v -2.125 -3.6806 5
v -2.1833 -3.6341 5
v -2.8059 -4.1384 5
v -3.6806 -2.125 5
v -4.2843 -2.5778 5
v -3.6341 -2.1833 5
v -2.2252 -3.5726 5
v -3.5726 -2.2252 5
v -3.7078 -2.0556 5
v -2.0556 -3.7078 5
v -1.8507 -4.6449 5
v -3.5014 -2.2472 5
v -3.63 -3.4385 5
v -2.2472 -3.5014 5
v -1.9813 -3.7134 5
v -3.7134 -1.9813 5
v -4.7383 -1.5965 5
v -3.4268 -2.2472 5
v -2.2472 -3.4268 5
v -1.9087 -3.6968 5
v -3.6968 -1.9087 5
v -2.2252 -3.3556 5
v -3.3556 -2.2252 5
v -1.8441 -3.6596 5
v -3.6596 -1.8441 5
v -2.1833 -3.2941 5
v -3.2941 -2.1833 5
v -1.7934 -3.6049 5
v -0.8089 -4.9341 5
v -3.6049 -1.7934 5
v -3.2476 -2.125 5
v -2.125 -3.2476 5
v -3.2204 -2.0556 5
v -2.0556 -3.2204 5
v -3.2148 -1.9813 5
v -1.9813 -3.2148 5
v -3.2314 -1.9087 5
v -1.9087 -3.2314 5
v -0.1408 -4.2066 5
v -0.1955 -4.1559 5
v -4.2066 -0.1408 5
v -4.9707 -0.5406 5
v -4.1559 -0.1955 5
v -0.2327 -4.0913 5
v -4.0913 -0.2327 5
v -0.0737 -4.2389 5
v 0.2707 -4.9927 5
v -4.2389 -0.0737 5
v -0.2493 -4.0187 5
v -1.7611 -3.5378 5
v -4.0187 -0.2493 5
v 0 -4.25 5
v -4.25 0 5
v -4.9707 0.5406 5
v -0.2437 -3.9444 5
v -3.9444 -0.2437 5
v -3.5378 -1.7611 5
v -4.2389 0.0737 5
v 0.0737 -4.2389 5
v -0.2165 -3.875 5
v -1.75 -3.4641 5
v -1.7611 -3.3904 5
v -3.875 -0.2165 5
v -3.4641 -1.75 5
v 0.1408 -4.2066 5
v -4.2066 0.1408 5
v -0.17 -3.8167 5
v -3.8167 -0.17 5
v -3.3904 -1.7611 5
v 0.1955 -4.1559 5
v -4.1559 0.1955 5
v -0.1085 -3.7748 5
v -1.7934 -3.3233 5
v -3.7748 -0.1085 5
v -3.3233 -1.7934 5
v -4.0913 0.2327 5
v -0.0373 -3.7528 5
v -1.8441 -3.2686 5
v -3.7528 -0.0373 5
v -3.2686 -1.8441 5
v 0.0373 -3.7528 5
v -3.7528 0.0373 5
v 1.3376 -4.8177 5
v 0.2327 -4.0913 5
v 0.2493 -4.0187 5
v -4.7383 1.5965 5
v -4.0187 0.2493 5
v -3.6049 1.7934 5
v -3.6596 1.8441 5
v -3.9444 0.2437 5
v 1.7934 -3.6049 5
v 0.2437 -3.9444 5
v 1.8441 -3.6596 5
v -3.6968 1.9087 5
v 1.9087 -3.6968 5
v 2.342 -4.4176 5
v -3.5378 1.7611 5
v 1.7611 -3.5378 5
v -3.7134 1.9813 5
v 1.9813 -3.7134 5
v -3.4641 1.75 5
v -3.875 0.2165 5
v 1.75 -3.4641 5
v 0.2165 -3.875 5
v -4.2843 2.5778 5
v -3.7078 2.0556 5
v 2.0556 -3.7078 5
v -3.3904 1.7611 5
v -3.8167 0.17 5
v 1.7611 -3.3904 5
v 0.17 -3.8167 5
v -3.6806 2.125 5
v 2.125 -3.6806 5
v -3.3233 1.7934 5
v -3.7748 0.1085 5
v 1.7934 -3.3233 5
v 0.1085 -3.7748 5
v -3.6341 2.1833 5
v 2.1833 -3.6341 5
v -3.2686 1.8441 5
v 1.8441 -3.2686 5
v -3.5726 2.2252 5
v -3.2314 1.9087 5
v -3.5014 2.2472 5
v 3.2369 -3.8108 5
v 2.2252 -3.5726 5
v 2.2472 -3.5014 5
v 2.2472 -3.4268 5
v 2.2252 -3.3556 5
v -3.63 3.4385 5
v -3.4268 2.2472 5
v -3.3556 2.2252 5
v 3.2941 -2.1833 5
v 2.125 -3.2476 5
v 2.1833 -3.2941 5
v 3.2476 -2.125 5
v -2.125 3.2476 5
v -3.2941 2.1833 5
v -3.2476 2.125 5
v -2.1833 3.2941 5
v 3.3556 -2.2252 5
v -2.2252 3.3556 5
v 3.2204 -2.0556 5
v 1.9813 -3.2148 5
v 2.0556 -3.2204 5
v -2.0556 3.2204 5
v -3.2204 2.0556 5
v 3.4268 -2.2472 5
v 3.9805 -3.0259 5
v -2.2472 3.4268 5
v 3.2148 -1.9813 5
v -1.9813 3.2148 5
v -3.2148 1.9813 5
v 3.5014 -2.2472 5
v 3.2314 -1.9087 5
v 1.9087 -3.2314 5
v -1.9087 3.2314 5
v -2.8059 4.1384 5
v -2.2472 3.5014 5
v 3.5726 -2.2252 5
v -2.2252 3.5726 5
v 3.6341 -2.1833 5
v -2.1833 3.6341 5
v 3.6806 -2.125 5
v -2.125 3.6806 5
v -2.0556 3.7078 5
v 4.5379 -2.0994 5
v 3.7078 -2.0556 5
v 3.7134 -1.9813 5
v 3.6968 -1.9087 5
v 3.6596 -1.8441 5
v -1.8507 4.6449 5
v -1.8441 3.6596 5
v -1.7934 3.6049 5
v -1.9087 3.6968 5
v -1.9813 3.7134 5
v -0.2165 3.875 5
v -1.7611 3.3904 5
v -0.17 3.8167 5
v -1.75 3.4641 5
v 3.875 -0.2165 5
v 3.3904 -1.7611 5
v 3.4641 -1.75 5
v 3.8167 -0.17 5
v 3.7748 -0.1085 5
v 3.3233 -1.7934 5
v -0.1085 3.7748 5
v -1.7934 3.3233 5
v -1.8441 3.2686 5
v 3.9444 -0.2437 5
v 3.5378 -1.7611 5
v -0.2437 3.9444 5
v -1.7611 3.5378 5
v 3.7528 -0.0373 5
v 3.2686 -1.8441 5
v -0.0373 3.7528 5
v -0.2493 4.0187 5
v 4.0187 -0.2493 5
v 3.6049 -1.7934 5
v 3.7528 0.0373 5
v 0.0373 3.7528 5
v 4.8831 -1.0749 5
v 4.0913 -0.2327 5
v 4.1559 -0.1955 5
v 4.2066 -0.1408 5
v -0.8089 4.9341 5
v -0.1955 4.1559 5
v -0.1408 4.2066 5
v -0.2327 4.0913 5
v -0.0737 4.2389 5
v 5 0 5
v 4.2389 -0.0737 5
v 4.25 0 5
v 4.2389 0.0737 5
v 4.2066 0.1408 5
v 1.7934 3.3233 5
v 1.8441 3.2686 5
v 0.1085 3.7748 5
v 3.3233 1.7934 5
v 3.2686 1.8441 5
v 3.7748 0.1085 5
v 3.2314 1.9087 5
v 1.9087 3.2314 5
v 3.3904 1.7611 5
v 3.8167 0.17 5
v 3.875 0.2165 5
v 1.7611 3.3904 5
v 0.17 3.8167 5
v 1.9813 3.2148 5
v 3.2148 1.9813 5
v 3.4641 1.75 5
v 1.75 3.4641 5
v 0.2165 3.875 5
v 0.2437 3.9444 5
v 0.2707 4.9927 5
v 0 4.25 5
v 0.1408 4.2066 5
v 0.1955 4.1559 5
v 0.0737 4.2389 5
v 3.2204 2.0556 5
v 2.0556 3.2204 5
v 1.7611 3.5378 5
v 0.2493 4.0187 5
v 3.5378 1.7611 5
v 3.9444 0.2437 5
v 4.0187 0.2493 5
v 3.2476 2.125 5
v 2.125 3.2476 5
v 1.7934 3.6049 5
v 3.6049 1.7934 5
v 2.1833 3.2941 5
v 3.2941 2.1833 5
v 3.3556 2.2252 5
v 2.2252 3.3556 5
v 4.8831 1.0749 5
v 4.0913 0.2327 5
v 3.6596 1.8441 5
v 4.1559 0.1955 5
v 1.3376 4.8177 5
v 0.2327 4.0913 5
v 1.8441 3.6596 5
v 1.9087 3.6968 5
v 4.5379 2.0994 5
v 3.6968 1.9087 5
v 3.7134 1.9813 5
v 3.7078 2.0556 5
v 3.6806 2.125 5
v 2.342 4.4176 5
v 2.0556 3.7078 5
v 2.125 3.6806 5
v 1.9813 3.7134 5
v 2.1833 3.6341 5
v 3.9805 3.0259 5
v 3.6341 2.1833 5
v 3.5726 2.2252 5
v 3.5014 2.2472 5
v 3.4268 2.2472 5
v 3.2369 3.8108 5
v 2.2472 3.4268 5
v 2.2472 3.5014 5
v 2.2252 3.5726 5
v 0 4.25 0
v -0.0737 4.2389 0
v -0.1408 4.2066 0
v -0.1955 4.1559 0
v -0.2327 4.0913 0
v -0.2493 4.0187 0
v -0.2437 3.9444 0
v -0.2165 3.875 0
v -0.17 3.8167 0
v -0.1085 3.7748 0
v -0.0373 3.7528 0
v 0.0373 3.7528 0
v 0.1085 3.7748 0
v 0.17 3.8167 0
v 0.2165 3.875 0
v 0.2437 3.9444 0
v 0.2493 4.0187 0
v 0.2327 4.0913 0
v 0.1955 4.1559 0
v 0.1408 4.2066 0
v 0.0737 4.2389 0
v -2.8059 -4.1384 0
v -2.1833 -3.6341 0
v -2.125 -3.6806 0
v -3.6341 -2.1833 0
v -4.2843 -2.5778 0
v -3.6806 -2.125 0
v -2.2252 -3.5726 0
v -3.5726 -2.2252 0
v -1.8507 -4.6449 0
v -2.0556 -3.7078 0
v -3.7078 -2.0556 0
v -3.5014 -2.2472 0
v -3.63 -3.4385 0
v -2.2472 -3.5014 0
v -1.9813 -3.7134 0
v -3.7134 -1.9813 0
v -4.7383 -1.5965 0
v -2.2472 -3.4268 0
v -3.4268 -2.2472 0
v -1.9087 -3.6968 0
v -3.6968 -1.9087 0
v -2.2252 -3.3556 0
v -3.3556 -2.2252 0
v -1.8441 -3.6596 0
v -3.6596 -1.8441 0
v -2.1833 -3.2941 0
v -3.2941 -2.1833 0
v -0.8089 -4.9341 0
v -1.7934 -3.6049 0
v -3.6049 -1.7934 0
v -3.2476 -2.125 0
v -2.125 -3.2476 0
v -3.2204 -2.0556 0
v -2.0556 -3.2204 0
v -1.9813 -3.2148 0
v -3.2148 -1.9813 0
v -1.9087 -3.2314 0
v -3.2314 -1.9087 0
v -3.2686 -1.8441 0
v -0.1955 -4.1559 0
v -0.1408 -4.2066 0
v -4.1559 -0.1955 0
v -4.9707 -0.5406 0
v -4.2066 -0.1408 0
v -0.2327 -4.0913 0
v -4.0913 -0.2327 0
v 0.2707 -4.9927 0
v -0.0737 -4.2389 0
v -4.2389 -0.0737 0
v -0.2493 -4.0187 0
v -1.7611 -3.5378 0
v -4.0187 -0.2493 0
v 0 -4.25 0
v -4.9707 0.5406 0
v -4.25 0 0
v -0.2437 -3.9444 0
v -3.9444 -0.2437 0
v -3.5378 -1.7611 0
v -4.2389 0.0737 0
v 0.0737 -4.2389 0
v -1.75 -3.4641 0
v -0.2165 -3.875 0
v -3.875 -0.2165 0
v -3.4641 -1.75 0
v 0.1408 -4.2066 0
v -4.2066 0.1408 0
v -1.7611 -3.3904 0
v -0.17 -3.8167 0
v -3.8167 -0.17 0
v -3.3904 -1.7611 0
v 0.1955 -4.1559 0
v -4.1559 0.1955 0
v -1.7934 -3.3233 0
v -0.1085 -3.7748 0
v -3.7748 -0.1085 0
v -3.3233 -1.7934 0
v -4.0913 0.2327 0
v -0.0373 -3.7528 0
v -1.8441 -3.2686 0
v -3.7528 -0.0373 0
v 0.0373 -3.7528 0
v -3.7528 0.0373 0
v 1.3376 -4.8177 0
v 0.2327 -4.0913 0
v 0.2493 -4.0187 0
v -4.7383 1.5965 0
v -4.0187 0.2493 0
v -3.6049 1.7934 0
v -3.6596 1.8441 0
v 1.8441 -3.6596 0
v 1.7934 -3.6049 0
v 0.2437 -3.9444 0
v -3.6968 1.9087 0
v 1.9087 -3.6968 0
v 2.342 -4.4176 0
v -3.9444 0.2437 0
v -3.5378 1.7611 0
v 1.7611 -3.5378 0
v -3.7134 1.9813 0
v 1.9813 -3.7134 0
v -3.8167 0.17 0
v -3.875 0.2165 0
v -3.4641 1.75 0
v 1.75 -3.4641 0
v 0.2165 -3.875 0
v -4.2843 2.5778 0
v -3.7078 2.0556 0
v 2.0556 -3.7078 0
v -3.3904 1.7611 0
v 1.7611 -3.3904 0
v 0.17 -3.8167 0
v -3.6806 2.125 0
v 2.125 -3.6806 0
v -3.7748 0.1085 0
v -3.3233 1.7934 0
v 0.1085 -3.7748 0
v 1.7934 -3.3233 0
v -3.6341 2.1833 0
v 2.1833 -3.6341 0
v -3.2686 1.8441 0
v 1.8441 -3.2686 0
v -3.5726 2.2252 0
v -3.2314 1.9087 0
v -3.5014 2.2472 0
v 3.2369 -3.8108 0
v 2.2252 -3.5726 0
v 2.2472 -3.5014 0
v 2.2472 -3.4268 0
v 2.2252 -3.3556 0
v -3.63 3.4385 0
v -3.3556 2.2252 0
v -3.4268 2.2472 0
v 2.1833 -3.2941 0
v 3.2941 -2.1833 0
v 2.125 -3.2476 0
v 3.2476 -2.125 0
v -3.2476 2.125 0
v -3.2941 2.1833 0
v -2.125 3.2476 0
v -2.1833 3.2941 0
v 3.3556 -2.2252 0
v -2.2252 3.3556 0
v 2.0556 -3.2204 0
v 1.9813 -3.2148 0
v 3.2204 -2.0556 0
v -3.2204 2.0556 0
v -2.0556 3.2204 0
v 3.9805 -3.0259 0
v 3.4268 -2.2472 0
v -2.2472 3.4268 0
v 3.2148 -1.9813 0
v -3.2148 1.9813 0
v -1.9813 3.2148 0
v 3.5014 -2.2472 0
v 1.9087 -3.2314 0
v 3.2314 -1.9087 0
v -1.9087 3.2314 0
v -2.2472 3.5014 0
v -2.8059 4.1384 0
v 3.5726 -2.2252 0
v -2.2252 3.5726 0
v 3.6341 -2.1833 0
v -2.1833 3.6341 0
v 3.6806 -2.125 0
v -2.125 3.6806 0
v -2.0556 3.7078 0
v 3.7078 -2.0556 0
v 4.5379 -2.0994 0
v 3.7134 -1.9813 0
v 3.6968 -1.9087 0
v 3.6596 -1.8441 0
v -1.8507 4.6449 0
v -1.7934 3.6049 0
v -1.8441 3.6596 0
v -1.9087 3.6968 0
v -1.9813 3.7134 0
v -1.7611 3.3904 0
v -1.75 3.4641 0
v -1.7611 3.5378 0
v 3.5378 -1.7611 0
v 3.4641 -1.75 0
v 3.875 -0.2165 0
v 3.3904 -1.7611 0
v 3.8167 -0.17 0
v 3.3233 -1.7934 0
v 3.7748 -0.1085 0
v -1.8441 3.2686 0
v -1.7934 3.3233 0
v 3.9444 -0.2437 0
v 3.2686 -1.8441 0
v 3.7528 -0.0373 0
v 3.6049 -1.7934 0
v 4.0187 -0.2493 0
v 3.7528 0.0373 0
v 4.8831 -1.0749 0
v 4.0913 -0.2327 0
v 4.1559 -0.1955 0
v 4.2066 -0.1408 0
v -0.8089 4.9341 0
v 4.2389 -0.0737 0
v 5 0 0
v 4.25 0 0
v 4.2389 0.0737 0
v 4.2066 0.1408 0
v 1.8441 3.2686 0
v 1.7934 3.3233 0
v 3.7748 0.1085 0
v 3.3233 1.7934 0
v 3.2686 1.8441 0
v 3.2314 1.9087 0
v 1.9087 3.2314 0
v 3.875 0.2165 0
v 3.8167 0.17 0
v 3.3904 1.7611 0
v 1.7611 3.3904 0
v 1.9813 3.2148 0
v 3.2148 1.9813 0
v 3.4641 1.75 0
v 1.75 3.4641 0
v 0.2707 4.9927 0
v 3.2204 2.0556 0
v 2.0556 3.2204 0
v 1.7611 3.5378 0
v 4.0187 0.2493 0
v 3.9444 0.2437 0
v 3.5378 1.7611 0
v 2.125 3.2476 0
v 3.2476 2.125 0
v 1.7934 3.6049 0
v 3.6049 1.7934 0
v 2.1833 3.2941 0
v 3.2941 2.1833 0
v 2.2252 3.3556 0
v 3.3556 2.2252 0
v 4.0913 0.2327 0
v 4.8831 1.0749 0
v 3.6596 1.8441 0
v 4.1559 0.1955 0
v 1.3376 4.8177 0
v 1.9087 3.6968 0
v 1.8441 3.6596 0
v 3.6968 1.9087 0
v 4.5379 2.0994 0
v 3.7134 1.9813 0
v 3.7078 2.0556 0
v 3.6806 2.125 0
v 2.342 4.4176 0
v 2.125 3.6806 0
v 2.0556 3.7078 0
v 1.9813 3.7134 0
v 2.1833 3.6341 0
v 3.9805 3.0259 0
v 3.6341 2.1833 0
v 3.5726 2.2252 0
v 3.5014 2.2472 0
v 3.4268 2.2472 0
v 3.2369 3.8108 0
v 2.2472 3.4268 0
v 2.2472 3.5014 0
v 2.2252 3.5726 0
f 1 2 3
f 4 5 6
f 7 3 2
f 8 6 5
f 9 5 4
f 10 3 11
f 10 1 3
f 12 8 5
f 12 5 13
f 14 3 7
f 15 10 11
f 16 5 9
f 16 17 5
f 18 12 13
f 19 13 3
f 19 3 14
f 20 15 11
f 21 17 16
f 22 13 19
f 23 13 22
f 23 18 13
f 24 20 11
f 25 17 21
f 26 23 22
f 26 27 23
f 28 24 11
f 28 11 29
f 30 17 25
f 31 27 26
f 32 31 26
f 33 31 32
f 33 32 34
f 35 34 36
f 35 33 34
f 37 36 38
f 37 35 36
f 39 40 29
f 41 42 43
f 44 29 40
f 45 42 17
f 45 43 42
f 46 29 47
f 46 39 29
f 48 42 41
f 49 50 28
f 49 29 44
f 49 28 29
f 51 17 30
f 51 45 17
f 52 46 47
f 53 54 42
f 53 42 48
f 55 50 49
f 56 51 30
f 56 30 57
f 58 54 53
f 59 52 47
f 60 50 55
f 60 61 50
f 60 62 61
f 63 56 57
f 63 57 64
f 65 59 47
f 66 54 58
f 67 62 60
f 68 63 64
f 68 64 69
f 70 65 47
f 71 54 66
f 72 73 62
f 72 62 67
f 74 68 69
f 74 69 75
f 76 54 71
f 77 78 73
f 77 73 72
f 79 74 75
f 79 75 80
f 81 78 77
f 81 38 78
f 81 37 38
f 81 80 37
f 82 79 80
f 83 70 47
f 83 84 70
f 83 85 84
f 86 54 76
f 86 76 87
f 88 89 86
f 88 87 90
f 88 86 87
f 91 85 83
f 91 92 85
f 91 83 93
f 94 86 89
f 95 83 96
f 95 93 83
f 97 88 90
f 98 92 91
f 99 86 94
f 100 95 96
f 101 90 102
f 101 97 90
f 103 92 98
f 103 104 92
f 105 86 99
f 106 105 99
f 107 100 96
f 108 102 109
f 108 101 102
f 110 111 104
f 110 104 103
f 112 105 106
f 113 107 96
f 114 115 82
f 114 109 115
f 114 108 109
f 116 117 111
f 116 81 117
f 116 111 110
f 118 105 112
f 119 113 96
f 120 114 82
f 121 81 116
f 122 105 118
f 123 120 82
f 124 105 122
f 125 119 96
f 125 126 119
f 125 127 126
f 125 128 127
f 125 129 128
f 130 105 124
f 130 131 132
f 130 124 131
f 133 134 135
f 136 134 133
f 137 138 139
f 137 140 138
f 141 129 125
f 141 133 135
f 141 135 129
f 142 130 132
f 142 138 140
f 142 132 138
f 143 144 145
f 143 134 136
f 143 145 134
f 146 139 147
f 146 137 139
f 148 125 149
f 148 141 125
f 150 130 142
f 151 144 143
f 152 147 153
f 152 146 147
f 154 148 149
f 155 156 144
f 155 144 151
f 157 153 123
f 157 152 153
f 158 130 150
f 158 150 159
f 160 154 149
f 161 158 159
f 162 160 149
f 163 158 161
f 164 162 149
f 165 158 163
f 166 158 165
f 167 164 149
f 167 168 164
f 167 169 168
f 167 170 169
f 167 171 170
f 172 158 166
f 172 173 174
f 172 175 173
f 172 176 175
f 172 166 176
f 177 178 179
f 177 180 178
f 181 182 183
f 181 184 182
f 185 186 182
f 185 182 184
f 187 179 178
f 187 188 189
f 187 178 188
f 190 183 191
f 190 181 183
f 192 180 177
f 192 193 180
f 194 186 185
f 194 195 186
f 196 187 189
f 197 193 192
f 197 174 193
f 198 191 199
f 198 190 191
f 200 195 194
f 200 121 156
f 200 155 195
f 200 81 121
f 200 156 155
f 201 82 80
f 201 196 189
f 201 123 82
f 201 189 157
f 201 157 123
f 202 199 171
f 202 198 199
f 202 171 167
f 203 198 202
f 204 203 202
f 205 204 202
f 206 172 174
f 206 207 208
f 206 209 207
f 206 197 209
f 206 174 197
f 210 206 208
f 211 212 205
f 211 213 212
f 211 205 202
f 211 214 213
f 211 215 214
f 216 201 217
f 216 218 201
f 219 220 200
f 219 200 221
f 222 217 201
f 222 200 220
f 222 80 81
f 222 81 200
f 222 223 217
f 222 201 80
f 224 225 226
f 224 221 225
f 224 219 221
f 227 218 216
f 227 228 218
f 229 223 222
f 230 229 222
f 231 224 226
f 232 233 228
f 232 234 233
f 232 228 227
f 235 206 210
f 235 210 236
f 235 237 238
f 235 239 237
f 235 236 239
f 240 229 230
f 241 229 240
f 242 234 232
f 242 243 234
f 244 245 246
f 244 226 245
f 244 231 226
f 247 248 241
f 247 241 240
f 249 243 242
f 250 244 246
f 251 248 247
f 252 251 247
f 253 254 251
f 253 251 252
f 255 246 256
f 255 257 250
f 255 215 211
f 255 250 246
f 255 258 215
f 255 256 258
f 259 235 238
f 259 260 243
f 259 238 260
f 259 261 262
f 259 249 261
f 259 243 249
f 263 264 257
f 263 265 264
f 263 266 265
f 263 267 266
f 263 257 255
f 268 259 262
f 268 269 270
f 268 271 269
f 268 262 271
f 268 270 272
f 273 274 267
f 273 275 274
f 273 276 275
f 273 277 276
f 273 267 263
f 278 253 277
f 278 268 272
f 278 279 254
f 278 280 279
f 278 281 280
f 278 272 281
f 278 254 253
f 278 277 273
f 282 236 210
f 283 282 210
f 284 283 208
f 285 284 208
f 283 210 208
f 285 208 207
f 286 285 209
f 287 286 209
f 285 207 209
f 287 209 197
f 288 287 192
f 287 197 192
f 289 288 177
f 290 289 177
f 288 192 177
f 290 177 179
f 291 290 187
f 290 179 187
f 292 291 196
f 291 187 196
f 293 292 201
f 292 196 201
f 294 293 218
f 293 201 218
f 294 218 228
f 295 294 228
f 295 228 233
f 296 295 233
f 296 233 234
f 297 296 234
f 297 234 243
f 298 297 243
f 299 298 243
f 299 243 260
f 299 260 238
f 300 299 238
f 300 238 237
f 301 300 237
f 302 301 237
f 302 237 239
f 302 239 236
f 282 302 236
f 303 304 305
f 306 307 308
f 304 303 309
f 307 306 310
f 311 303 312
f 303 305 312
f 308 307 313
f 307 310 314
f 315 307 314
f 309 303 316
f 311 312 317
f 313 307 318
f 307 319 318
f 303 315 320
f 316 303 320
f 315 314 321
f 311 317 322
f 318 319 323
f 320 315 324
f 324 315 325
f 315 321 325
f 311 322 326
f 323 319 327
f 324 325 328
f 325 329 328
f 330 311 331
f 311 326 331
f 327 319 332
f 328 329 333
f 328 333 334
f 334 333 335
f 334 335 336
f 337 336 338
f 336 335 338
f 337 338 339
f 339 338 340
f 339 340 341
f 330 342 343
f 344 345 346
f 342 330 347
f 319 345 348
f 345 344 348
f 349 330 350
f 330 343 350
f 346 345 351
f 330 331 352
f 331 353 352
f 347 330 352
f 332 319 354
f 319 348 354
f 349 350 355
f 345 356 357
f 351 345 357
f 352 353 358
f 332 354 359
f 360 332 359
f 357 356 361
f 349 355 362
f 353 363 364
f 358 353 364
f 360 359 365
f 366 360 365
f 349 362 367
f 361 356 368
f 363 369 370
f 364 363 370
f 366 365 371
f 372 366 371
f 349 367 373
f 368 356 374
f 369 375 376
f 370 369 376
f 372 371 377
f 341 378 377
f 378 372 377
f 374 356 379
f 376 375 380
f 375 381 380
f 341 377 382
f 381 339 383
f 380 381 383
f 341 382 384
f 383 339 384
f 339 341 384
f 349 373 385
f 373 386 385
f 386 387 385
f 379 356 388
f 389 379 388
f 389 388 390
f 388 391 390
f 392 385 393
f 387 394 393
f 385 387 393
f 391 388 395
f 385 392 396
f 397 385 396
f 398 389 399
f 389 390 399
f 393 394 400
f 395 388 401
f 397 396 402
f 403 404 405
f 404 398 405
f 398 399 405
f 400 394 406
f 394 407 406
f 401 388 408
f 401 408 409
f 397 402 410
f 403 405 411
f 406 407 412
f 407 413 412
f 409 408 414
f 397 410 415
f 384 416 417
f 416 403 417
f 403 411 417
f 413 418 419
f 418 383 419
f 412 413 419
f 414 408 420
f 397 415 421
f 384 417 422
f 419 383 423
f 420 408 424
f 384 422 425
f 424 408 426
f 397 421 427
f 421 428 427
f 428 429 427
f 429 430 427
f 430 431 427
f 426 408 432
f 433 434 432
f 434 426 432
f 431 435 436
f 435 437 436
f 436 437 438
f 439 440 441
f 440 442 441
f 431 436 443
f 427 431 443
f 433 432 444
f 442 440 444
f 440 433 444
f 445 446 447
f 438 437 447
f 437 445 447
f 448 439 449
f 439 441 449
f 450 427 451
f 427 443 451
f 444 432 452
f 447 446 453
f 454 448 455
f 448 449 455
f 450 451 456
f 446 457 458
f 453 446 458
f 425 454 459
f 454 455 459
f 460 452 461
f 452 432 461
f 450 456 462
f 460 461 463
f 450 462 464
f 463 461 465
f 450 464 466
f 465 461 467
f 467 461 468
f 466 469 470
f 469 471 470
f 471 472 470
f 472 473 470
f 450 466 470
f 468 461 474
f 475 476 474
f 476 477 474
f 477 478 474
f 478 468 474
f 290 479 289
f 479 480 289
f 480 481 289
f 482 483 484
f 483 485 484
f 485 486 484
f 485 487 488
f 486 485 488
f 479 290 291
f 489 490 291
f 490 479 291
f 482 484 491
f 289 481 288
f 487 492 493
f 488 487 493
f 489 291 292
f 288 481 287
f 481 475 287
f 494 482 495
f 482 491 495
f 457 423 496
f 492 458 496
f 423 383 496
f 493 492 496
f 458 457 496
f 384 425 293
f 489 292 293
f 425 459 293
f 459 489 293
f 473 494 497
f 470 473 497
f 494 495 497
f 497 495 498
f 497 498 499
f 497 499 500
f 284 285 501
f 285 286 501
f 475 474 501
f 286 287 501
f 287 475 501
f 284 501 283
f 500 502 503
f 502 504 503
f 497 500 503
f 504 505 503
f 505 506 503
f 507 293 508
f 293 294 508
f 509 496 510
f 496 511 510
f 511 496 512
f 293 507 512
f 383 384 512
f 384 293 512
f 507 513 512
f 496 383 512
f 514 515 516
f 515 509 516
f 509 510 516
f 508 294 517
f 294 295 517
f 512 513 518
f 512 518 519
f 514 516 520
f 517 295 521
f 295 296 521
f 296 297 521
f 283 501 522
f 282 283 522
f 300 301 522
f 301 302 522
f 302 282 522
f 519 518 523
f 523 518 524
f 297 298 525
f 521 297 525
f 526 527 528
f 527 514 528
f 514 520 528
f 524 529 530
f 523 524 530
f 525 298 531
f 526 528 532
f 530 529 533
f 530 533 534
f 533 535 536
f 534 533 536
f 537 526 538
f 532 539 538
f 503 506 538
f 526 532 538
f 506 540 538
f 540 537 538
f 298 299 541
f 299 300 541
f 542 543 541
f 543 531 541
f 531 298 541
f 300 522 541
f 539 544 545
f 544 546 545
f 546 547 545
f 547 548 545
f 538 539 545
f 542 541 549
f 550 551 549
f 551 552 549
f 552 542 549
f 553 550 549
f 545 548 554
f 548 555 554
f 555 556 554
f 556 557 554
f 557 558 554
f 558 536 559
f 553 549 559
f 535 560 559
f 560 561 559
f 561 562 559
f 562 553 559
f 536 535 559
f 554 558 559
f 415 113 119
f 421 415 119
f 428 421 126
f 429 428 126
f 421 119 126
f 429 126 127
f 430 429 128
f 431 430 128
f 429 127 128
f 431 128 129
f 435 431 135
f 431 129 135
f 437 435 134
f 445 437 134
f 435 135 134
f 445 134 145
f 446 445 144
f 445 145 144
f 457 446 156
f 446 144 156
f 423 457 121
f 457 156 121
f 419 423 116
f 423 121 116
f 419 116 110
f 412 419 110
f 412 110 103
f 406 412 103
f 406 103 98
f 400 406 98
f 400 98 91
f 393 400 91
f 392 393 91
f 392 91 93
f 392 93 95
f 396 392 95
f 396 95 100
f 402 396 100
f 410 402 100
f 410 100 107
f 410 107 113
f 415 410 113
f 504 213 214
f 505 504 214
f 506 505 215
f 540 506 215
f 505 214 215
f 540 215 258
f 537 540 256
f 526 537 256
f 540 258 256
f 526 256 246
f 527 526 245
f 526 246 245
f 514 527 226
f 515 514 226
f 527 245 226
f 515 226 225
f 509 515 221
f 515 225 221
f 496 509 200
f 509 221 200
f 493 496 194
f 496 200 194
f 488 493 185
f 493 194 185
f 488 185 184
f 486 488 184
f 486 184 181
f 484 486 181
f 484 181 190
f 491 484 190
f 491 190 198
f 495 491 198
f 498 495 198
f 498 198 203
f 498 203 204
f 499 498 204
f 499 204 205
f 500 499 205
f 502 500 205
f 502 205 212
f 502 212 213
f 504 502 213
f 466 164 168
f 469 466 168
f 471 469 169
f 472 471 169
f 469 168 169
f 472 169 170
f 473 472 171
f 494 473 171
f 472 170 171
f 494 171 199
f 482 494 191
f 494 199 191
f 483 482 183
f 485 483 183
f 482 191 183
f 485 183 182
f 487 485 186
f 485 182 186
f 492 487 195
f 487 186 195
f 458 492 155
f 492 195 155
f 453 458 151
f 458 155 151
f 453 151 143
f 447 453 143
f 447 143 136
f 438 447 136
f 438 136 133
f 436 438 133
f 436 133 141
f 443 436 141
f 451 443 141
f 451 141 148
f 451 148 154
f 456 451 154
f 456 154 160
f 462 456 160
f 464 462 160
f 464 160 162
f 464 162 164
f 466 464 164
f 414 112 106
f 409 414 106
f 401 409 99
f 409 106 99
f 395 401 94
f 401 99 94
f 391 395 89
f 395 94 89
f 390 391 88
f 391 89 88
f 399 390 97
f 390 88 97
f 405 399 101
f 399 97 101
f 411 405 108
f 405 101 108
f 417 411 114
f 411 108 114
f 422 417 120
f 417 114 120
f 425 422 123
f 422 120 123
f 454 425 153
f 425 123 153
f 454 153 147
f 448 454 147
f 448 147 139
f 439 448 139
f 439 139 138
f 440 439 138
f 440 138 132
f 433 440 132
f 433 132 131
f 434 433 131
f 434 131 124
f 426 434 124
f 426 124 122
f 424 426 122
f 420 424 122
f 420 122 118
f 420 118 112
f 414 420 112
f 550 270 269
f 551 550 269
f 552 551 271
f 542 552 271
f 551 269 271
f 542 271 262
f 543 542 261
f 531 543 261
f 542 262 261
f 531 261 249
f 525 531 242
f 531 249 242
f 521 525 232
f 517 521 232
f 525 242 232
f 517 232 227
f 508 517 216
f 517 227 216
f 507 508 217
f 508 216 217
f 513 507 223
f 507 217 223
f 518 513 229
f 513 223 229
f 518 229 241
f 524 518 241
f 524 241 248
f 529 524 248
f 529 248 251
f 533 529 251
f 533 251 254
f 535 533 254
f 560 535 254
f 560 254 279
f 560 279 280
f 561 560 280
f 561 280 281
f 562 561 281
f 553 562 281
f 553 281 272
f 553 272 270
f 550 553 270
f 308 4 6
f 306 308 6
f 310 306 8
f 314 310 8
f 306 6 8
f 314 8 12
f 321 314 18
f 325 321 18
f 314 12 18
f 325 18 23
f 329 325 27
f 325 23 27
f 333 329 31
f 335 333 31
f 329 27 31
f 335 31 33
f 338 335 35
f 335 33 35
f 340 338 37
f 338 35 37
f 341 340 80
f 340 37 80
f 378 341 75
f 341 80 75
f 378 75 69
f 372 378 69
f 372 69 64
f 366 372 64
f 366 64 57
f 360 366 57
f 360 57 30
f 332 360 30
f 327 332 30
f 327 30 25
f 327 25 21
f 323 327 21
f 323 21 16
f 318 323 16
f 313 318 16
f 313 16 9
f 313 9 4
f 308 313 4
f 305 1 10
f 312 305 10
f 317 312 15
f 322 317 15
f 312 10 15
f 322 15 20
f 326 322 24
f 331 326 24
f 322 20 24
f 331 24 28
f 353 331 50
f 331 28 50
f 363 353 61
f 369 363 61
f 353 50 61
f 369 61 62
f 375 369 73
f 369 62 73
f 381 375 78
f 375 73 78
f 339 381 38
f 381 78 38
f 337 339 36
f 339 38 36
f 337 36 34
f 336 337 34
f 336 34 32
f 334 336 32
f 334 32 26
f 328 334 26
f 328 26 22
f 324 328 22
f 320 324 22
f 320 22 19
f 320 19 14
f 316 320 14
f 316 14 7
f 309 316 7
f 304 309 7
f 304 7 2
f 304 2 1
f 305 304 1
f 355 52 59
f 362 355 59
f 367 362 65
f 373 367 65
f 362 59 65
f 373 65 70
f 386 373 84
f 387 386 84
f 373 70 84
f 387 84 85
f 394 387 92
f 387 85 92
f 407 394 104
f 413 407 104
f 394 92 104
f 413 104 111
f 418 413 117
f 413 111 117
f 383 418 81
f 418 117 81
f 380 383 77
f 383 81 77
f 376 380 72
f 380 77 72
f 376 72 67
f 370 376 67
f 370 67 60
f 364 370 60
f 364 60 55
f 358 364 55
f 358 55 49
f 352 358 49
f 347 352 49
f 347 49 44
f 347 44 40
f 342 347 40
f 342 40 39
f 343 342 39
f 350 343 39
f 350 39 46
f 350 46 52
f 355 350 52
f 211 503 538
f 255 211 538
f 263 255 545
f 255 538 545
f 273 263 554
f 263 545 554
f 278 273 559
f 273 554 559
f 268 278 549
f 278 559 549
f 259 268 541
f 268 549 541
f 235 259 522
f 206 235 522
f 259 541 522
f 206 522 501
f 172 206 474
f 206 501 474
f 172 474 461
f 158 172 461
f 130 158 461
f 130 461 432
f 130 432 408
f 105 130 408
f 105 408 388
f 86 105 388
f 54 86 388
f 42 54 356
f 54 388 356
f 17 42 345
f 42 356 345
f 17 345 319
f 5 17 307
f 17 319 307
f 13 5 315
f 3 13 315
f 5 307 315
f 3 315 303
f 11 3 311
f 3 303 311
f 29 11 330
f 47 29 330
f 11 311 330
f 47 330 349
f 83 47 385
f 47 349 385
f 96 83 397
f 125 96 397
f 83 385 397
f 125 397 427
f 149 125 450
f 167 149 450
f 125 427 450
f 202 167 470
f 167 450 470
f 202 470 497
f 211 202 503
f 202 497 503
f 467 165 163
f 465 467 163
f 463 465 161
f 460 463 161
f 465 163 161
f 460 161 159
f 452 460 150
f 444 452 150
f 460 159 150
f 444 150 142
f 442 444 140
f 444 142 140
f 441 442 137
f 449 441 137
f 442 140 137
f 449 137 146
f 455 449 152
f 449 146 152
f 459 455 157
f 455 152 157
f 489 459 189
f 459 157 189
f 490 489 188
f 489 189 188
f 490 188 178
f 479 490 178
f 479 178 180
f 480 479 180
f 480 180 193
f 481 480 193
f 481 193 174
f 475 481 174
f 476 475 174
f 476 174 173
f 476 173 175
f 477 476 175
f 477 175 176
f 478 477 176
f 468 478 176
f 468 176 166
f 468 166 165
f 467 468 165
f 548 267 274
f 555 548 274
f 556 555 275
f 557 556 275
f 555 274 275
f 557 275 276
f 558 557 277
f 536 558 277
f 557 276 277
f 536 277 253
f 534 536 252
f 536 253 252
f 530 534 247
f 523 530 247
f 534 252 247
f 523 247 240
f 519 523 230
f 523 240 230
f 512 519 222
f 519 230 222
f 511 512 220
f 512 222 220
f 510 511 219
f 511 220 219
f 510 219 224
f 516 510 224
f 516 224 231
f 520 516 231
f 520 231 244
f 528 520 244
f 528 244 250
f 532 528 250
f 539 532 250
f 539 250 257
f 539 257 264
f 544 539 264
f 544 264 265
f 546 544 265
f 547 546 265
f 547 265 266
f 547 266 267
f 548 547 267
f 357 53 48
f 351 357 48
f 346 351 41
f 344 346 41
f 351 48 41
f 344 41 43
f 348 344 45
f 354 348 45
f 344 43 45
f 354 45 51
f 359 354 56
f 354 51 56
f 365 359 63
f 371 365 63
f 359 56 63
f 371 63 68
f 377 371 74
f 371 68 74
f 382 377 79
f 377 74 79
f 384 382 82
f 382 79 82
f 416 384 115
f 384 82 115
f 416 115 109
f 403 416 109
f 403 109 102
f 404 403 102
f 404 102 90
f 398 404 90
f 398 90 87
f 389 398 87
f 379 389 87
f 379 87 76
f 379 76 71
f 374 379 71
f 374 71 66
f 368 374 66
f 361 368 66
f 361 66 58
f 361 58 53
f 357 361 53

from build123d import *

# Parameters (mm, degrees)
SKETCH1_R           = 5
BOSS_EXTRUDE1_DEPTH = 5
SKETCH2_R           = 0.25
CUT_EXTRUDE1_DEPTH  = 6
CIRPATTERN1_COUNT   = 12


with BuildPart() as part:
    # Sketch1 → Boss-Extrude1 (new body)
    with BuildSketch(Plane.XY):
        Circle(SKETCH1_R)
    extrude(amount=BOSS_EXTRUDE1_DEPTH)

    # Sketch2 → Cut-Extrude1 (cut, through all)
    with BuildSketch(Plane.XY.offset(5)):
        with Locations((4, 0)):
            Circle(SKETCH2_R)
    cut_extrude1 = extrude(amount=-CUT_EXTRUDE1_DEPTH, mode=Mode.SUBTRACT)

    # CirPattern1: Cut-Extrude1 ×12 about axis
    cirpattern1_axis = Axis((0, 0, 0), (0, 0, 1))
    for i in range(1, CIRPATTERN1_COUNT):
        add(cut_extrude1.rotate(cirpattern1_axis, i * 360 / CIRPATTERN1_COUNT), mode=Mode.SUBTRACT)


solid = part.part
